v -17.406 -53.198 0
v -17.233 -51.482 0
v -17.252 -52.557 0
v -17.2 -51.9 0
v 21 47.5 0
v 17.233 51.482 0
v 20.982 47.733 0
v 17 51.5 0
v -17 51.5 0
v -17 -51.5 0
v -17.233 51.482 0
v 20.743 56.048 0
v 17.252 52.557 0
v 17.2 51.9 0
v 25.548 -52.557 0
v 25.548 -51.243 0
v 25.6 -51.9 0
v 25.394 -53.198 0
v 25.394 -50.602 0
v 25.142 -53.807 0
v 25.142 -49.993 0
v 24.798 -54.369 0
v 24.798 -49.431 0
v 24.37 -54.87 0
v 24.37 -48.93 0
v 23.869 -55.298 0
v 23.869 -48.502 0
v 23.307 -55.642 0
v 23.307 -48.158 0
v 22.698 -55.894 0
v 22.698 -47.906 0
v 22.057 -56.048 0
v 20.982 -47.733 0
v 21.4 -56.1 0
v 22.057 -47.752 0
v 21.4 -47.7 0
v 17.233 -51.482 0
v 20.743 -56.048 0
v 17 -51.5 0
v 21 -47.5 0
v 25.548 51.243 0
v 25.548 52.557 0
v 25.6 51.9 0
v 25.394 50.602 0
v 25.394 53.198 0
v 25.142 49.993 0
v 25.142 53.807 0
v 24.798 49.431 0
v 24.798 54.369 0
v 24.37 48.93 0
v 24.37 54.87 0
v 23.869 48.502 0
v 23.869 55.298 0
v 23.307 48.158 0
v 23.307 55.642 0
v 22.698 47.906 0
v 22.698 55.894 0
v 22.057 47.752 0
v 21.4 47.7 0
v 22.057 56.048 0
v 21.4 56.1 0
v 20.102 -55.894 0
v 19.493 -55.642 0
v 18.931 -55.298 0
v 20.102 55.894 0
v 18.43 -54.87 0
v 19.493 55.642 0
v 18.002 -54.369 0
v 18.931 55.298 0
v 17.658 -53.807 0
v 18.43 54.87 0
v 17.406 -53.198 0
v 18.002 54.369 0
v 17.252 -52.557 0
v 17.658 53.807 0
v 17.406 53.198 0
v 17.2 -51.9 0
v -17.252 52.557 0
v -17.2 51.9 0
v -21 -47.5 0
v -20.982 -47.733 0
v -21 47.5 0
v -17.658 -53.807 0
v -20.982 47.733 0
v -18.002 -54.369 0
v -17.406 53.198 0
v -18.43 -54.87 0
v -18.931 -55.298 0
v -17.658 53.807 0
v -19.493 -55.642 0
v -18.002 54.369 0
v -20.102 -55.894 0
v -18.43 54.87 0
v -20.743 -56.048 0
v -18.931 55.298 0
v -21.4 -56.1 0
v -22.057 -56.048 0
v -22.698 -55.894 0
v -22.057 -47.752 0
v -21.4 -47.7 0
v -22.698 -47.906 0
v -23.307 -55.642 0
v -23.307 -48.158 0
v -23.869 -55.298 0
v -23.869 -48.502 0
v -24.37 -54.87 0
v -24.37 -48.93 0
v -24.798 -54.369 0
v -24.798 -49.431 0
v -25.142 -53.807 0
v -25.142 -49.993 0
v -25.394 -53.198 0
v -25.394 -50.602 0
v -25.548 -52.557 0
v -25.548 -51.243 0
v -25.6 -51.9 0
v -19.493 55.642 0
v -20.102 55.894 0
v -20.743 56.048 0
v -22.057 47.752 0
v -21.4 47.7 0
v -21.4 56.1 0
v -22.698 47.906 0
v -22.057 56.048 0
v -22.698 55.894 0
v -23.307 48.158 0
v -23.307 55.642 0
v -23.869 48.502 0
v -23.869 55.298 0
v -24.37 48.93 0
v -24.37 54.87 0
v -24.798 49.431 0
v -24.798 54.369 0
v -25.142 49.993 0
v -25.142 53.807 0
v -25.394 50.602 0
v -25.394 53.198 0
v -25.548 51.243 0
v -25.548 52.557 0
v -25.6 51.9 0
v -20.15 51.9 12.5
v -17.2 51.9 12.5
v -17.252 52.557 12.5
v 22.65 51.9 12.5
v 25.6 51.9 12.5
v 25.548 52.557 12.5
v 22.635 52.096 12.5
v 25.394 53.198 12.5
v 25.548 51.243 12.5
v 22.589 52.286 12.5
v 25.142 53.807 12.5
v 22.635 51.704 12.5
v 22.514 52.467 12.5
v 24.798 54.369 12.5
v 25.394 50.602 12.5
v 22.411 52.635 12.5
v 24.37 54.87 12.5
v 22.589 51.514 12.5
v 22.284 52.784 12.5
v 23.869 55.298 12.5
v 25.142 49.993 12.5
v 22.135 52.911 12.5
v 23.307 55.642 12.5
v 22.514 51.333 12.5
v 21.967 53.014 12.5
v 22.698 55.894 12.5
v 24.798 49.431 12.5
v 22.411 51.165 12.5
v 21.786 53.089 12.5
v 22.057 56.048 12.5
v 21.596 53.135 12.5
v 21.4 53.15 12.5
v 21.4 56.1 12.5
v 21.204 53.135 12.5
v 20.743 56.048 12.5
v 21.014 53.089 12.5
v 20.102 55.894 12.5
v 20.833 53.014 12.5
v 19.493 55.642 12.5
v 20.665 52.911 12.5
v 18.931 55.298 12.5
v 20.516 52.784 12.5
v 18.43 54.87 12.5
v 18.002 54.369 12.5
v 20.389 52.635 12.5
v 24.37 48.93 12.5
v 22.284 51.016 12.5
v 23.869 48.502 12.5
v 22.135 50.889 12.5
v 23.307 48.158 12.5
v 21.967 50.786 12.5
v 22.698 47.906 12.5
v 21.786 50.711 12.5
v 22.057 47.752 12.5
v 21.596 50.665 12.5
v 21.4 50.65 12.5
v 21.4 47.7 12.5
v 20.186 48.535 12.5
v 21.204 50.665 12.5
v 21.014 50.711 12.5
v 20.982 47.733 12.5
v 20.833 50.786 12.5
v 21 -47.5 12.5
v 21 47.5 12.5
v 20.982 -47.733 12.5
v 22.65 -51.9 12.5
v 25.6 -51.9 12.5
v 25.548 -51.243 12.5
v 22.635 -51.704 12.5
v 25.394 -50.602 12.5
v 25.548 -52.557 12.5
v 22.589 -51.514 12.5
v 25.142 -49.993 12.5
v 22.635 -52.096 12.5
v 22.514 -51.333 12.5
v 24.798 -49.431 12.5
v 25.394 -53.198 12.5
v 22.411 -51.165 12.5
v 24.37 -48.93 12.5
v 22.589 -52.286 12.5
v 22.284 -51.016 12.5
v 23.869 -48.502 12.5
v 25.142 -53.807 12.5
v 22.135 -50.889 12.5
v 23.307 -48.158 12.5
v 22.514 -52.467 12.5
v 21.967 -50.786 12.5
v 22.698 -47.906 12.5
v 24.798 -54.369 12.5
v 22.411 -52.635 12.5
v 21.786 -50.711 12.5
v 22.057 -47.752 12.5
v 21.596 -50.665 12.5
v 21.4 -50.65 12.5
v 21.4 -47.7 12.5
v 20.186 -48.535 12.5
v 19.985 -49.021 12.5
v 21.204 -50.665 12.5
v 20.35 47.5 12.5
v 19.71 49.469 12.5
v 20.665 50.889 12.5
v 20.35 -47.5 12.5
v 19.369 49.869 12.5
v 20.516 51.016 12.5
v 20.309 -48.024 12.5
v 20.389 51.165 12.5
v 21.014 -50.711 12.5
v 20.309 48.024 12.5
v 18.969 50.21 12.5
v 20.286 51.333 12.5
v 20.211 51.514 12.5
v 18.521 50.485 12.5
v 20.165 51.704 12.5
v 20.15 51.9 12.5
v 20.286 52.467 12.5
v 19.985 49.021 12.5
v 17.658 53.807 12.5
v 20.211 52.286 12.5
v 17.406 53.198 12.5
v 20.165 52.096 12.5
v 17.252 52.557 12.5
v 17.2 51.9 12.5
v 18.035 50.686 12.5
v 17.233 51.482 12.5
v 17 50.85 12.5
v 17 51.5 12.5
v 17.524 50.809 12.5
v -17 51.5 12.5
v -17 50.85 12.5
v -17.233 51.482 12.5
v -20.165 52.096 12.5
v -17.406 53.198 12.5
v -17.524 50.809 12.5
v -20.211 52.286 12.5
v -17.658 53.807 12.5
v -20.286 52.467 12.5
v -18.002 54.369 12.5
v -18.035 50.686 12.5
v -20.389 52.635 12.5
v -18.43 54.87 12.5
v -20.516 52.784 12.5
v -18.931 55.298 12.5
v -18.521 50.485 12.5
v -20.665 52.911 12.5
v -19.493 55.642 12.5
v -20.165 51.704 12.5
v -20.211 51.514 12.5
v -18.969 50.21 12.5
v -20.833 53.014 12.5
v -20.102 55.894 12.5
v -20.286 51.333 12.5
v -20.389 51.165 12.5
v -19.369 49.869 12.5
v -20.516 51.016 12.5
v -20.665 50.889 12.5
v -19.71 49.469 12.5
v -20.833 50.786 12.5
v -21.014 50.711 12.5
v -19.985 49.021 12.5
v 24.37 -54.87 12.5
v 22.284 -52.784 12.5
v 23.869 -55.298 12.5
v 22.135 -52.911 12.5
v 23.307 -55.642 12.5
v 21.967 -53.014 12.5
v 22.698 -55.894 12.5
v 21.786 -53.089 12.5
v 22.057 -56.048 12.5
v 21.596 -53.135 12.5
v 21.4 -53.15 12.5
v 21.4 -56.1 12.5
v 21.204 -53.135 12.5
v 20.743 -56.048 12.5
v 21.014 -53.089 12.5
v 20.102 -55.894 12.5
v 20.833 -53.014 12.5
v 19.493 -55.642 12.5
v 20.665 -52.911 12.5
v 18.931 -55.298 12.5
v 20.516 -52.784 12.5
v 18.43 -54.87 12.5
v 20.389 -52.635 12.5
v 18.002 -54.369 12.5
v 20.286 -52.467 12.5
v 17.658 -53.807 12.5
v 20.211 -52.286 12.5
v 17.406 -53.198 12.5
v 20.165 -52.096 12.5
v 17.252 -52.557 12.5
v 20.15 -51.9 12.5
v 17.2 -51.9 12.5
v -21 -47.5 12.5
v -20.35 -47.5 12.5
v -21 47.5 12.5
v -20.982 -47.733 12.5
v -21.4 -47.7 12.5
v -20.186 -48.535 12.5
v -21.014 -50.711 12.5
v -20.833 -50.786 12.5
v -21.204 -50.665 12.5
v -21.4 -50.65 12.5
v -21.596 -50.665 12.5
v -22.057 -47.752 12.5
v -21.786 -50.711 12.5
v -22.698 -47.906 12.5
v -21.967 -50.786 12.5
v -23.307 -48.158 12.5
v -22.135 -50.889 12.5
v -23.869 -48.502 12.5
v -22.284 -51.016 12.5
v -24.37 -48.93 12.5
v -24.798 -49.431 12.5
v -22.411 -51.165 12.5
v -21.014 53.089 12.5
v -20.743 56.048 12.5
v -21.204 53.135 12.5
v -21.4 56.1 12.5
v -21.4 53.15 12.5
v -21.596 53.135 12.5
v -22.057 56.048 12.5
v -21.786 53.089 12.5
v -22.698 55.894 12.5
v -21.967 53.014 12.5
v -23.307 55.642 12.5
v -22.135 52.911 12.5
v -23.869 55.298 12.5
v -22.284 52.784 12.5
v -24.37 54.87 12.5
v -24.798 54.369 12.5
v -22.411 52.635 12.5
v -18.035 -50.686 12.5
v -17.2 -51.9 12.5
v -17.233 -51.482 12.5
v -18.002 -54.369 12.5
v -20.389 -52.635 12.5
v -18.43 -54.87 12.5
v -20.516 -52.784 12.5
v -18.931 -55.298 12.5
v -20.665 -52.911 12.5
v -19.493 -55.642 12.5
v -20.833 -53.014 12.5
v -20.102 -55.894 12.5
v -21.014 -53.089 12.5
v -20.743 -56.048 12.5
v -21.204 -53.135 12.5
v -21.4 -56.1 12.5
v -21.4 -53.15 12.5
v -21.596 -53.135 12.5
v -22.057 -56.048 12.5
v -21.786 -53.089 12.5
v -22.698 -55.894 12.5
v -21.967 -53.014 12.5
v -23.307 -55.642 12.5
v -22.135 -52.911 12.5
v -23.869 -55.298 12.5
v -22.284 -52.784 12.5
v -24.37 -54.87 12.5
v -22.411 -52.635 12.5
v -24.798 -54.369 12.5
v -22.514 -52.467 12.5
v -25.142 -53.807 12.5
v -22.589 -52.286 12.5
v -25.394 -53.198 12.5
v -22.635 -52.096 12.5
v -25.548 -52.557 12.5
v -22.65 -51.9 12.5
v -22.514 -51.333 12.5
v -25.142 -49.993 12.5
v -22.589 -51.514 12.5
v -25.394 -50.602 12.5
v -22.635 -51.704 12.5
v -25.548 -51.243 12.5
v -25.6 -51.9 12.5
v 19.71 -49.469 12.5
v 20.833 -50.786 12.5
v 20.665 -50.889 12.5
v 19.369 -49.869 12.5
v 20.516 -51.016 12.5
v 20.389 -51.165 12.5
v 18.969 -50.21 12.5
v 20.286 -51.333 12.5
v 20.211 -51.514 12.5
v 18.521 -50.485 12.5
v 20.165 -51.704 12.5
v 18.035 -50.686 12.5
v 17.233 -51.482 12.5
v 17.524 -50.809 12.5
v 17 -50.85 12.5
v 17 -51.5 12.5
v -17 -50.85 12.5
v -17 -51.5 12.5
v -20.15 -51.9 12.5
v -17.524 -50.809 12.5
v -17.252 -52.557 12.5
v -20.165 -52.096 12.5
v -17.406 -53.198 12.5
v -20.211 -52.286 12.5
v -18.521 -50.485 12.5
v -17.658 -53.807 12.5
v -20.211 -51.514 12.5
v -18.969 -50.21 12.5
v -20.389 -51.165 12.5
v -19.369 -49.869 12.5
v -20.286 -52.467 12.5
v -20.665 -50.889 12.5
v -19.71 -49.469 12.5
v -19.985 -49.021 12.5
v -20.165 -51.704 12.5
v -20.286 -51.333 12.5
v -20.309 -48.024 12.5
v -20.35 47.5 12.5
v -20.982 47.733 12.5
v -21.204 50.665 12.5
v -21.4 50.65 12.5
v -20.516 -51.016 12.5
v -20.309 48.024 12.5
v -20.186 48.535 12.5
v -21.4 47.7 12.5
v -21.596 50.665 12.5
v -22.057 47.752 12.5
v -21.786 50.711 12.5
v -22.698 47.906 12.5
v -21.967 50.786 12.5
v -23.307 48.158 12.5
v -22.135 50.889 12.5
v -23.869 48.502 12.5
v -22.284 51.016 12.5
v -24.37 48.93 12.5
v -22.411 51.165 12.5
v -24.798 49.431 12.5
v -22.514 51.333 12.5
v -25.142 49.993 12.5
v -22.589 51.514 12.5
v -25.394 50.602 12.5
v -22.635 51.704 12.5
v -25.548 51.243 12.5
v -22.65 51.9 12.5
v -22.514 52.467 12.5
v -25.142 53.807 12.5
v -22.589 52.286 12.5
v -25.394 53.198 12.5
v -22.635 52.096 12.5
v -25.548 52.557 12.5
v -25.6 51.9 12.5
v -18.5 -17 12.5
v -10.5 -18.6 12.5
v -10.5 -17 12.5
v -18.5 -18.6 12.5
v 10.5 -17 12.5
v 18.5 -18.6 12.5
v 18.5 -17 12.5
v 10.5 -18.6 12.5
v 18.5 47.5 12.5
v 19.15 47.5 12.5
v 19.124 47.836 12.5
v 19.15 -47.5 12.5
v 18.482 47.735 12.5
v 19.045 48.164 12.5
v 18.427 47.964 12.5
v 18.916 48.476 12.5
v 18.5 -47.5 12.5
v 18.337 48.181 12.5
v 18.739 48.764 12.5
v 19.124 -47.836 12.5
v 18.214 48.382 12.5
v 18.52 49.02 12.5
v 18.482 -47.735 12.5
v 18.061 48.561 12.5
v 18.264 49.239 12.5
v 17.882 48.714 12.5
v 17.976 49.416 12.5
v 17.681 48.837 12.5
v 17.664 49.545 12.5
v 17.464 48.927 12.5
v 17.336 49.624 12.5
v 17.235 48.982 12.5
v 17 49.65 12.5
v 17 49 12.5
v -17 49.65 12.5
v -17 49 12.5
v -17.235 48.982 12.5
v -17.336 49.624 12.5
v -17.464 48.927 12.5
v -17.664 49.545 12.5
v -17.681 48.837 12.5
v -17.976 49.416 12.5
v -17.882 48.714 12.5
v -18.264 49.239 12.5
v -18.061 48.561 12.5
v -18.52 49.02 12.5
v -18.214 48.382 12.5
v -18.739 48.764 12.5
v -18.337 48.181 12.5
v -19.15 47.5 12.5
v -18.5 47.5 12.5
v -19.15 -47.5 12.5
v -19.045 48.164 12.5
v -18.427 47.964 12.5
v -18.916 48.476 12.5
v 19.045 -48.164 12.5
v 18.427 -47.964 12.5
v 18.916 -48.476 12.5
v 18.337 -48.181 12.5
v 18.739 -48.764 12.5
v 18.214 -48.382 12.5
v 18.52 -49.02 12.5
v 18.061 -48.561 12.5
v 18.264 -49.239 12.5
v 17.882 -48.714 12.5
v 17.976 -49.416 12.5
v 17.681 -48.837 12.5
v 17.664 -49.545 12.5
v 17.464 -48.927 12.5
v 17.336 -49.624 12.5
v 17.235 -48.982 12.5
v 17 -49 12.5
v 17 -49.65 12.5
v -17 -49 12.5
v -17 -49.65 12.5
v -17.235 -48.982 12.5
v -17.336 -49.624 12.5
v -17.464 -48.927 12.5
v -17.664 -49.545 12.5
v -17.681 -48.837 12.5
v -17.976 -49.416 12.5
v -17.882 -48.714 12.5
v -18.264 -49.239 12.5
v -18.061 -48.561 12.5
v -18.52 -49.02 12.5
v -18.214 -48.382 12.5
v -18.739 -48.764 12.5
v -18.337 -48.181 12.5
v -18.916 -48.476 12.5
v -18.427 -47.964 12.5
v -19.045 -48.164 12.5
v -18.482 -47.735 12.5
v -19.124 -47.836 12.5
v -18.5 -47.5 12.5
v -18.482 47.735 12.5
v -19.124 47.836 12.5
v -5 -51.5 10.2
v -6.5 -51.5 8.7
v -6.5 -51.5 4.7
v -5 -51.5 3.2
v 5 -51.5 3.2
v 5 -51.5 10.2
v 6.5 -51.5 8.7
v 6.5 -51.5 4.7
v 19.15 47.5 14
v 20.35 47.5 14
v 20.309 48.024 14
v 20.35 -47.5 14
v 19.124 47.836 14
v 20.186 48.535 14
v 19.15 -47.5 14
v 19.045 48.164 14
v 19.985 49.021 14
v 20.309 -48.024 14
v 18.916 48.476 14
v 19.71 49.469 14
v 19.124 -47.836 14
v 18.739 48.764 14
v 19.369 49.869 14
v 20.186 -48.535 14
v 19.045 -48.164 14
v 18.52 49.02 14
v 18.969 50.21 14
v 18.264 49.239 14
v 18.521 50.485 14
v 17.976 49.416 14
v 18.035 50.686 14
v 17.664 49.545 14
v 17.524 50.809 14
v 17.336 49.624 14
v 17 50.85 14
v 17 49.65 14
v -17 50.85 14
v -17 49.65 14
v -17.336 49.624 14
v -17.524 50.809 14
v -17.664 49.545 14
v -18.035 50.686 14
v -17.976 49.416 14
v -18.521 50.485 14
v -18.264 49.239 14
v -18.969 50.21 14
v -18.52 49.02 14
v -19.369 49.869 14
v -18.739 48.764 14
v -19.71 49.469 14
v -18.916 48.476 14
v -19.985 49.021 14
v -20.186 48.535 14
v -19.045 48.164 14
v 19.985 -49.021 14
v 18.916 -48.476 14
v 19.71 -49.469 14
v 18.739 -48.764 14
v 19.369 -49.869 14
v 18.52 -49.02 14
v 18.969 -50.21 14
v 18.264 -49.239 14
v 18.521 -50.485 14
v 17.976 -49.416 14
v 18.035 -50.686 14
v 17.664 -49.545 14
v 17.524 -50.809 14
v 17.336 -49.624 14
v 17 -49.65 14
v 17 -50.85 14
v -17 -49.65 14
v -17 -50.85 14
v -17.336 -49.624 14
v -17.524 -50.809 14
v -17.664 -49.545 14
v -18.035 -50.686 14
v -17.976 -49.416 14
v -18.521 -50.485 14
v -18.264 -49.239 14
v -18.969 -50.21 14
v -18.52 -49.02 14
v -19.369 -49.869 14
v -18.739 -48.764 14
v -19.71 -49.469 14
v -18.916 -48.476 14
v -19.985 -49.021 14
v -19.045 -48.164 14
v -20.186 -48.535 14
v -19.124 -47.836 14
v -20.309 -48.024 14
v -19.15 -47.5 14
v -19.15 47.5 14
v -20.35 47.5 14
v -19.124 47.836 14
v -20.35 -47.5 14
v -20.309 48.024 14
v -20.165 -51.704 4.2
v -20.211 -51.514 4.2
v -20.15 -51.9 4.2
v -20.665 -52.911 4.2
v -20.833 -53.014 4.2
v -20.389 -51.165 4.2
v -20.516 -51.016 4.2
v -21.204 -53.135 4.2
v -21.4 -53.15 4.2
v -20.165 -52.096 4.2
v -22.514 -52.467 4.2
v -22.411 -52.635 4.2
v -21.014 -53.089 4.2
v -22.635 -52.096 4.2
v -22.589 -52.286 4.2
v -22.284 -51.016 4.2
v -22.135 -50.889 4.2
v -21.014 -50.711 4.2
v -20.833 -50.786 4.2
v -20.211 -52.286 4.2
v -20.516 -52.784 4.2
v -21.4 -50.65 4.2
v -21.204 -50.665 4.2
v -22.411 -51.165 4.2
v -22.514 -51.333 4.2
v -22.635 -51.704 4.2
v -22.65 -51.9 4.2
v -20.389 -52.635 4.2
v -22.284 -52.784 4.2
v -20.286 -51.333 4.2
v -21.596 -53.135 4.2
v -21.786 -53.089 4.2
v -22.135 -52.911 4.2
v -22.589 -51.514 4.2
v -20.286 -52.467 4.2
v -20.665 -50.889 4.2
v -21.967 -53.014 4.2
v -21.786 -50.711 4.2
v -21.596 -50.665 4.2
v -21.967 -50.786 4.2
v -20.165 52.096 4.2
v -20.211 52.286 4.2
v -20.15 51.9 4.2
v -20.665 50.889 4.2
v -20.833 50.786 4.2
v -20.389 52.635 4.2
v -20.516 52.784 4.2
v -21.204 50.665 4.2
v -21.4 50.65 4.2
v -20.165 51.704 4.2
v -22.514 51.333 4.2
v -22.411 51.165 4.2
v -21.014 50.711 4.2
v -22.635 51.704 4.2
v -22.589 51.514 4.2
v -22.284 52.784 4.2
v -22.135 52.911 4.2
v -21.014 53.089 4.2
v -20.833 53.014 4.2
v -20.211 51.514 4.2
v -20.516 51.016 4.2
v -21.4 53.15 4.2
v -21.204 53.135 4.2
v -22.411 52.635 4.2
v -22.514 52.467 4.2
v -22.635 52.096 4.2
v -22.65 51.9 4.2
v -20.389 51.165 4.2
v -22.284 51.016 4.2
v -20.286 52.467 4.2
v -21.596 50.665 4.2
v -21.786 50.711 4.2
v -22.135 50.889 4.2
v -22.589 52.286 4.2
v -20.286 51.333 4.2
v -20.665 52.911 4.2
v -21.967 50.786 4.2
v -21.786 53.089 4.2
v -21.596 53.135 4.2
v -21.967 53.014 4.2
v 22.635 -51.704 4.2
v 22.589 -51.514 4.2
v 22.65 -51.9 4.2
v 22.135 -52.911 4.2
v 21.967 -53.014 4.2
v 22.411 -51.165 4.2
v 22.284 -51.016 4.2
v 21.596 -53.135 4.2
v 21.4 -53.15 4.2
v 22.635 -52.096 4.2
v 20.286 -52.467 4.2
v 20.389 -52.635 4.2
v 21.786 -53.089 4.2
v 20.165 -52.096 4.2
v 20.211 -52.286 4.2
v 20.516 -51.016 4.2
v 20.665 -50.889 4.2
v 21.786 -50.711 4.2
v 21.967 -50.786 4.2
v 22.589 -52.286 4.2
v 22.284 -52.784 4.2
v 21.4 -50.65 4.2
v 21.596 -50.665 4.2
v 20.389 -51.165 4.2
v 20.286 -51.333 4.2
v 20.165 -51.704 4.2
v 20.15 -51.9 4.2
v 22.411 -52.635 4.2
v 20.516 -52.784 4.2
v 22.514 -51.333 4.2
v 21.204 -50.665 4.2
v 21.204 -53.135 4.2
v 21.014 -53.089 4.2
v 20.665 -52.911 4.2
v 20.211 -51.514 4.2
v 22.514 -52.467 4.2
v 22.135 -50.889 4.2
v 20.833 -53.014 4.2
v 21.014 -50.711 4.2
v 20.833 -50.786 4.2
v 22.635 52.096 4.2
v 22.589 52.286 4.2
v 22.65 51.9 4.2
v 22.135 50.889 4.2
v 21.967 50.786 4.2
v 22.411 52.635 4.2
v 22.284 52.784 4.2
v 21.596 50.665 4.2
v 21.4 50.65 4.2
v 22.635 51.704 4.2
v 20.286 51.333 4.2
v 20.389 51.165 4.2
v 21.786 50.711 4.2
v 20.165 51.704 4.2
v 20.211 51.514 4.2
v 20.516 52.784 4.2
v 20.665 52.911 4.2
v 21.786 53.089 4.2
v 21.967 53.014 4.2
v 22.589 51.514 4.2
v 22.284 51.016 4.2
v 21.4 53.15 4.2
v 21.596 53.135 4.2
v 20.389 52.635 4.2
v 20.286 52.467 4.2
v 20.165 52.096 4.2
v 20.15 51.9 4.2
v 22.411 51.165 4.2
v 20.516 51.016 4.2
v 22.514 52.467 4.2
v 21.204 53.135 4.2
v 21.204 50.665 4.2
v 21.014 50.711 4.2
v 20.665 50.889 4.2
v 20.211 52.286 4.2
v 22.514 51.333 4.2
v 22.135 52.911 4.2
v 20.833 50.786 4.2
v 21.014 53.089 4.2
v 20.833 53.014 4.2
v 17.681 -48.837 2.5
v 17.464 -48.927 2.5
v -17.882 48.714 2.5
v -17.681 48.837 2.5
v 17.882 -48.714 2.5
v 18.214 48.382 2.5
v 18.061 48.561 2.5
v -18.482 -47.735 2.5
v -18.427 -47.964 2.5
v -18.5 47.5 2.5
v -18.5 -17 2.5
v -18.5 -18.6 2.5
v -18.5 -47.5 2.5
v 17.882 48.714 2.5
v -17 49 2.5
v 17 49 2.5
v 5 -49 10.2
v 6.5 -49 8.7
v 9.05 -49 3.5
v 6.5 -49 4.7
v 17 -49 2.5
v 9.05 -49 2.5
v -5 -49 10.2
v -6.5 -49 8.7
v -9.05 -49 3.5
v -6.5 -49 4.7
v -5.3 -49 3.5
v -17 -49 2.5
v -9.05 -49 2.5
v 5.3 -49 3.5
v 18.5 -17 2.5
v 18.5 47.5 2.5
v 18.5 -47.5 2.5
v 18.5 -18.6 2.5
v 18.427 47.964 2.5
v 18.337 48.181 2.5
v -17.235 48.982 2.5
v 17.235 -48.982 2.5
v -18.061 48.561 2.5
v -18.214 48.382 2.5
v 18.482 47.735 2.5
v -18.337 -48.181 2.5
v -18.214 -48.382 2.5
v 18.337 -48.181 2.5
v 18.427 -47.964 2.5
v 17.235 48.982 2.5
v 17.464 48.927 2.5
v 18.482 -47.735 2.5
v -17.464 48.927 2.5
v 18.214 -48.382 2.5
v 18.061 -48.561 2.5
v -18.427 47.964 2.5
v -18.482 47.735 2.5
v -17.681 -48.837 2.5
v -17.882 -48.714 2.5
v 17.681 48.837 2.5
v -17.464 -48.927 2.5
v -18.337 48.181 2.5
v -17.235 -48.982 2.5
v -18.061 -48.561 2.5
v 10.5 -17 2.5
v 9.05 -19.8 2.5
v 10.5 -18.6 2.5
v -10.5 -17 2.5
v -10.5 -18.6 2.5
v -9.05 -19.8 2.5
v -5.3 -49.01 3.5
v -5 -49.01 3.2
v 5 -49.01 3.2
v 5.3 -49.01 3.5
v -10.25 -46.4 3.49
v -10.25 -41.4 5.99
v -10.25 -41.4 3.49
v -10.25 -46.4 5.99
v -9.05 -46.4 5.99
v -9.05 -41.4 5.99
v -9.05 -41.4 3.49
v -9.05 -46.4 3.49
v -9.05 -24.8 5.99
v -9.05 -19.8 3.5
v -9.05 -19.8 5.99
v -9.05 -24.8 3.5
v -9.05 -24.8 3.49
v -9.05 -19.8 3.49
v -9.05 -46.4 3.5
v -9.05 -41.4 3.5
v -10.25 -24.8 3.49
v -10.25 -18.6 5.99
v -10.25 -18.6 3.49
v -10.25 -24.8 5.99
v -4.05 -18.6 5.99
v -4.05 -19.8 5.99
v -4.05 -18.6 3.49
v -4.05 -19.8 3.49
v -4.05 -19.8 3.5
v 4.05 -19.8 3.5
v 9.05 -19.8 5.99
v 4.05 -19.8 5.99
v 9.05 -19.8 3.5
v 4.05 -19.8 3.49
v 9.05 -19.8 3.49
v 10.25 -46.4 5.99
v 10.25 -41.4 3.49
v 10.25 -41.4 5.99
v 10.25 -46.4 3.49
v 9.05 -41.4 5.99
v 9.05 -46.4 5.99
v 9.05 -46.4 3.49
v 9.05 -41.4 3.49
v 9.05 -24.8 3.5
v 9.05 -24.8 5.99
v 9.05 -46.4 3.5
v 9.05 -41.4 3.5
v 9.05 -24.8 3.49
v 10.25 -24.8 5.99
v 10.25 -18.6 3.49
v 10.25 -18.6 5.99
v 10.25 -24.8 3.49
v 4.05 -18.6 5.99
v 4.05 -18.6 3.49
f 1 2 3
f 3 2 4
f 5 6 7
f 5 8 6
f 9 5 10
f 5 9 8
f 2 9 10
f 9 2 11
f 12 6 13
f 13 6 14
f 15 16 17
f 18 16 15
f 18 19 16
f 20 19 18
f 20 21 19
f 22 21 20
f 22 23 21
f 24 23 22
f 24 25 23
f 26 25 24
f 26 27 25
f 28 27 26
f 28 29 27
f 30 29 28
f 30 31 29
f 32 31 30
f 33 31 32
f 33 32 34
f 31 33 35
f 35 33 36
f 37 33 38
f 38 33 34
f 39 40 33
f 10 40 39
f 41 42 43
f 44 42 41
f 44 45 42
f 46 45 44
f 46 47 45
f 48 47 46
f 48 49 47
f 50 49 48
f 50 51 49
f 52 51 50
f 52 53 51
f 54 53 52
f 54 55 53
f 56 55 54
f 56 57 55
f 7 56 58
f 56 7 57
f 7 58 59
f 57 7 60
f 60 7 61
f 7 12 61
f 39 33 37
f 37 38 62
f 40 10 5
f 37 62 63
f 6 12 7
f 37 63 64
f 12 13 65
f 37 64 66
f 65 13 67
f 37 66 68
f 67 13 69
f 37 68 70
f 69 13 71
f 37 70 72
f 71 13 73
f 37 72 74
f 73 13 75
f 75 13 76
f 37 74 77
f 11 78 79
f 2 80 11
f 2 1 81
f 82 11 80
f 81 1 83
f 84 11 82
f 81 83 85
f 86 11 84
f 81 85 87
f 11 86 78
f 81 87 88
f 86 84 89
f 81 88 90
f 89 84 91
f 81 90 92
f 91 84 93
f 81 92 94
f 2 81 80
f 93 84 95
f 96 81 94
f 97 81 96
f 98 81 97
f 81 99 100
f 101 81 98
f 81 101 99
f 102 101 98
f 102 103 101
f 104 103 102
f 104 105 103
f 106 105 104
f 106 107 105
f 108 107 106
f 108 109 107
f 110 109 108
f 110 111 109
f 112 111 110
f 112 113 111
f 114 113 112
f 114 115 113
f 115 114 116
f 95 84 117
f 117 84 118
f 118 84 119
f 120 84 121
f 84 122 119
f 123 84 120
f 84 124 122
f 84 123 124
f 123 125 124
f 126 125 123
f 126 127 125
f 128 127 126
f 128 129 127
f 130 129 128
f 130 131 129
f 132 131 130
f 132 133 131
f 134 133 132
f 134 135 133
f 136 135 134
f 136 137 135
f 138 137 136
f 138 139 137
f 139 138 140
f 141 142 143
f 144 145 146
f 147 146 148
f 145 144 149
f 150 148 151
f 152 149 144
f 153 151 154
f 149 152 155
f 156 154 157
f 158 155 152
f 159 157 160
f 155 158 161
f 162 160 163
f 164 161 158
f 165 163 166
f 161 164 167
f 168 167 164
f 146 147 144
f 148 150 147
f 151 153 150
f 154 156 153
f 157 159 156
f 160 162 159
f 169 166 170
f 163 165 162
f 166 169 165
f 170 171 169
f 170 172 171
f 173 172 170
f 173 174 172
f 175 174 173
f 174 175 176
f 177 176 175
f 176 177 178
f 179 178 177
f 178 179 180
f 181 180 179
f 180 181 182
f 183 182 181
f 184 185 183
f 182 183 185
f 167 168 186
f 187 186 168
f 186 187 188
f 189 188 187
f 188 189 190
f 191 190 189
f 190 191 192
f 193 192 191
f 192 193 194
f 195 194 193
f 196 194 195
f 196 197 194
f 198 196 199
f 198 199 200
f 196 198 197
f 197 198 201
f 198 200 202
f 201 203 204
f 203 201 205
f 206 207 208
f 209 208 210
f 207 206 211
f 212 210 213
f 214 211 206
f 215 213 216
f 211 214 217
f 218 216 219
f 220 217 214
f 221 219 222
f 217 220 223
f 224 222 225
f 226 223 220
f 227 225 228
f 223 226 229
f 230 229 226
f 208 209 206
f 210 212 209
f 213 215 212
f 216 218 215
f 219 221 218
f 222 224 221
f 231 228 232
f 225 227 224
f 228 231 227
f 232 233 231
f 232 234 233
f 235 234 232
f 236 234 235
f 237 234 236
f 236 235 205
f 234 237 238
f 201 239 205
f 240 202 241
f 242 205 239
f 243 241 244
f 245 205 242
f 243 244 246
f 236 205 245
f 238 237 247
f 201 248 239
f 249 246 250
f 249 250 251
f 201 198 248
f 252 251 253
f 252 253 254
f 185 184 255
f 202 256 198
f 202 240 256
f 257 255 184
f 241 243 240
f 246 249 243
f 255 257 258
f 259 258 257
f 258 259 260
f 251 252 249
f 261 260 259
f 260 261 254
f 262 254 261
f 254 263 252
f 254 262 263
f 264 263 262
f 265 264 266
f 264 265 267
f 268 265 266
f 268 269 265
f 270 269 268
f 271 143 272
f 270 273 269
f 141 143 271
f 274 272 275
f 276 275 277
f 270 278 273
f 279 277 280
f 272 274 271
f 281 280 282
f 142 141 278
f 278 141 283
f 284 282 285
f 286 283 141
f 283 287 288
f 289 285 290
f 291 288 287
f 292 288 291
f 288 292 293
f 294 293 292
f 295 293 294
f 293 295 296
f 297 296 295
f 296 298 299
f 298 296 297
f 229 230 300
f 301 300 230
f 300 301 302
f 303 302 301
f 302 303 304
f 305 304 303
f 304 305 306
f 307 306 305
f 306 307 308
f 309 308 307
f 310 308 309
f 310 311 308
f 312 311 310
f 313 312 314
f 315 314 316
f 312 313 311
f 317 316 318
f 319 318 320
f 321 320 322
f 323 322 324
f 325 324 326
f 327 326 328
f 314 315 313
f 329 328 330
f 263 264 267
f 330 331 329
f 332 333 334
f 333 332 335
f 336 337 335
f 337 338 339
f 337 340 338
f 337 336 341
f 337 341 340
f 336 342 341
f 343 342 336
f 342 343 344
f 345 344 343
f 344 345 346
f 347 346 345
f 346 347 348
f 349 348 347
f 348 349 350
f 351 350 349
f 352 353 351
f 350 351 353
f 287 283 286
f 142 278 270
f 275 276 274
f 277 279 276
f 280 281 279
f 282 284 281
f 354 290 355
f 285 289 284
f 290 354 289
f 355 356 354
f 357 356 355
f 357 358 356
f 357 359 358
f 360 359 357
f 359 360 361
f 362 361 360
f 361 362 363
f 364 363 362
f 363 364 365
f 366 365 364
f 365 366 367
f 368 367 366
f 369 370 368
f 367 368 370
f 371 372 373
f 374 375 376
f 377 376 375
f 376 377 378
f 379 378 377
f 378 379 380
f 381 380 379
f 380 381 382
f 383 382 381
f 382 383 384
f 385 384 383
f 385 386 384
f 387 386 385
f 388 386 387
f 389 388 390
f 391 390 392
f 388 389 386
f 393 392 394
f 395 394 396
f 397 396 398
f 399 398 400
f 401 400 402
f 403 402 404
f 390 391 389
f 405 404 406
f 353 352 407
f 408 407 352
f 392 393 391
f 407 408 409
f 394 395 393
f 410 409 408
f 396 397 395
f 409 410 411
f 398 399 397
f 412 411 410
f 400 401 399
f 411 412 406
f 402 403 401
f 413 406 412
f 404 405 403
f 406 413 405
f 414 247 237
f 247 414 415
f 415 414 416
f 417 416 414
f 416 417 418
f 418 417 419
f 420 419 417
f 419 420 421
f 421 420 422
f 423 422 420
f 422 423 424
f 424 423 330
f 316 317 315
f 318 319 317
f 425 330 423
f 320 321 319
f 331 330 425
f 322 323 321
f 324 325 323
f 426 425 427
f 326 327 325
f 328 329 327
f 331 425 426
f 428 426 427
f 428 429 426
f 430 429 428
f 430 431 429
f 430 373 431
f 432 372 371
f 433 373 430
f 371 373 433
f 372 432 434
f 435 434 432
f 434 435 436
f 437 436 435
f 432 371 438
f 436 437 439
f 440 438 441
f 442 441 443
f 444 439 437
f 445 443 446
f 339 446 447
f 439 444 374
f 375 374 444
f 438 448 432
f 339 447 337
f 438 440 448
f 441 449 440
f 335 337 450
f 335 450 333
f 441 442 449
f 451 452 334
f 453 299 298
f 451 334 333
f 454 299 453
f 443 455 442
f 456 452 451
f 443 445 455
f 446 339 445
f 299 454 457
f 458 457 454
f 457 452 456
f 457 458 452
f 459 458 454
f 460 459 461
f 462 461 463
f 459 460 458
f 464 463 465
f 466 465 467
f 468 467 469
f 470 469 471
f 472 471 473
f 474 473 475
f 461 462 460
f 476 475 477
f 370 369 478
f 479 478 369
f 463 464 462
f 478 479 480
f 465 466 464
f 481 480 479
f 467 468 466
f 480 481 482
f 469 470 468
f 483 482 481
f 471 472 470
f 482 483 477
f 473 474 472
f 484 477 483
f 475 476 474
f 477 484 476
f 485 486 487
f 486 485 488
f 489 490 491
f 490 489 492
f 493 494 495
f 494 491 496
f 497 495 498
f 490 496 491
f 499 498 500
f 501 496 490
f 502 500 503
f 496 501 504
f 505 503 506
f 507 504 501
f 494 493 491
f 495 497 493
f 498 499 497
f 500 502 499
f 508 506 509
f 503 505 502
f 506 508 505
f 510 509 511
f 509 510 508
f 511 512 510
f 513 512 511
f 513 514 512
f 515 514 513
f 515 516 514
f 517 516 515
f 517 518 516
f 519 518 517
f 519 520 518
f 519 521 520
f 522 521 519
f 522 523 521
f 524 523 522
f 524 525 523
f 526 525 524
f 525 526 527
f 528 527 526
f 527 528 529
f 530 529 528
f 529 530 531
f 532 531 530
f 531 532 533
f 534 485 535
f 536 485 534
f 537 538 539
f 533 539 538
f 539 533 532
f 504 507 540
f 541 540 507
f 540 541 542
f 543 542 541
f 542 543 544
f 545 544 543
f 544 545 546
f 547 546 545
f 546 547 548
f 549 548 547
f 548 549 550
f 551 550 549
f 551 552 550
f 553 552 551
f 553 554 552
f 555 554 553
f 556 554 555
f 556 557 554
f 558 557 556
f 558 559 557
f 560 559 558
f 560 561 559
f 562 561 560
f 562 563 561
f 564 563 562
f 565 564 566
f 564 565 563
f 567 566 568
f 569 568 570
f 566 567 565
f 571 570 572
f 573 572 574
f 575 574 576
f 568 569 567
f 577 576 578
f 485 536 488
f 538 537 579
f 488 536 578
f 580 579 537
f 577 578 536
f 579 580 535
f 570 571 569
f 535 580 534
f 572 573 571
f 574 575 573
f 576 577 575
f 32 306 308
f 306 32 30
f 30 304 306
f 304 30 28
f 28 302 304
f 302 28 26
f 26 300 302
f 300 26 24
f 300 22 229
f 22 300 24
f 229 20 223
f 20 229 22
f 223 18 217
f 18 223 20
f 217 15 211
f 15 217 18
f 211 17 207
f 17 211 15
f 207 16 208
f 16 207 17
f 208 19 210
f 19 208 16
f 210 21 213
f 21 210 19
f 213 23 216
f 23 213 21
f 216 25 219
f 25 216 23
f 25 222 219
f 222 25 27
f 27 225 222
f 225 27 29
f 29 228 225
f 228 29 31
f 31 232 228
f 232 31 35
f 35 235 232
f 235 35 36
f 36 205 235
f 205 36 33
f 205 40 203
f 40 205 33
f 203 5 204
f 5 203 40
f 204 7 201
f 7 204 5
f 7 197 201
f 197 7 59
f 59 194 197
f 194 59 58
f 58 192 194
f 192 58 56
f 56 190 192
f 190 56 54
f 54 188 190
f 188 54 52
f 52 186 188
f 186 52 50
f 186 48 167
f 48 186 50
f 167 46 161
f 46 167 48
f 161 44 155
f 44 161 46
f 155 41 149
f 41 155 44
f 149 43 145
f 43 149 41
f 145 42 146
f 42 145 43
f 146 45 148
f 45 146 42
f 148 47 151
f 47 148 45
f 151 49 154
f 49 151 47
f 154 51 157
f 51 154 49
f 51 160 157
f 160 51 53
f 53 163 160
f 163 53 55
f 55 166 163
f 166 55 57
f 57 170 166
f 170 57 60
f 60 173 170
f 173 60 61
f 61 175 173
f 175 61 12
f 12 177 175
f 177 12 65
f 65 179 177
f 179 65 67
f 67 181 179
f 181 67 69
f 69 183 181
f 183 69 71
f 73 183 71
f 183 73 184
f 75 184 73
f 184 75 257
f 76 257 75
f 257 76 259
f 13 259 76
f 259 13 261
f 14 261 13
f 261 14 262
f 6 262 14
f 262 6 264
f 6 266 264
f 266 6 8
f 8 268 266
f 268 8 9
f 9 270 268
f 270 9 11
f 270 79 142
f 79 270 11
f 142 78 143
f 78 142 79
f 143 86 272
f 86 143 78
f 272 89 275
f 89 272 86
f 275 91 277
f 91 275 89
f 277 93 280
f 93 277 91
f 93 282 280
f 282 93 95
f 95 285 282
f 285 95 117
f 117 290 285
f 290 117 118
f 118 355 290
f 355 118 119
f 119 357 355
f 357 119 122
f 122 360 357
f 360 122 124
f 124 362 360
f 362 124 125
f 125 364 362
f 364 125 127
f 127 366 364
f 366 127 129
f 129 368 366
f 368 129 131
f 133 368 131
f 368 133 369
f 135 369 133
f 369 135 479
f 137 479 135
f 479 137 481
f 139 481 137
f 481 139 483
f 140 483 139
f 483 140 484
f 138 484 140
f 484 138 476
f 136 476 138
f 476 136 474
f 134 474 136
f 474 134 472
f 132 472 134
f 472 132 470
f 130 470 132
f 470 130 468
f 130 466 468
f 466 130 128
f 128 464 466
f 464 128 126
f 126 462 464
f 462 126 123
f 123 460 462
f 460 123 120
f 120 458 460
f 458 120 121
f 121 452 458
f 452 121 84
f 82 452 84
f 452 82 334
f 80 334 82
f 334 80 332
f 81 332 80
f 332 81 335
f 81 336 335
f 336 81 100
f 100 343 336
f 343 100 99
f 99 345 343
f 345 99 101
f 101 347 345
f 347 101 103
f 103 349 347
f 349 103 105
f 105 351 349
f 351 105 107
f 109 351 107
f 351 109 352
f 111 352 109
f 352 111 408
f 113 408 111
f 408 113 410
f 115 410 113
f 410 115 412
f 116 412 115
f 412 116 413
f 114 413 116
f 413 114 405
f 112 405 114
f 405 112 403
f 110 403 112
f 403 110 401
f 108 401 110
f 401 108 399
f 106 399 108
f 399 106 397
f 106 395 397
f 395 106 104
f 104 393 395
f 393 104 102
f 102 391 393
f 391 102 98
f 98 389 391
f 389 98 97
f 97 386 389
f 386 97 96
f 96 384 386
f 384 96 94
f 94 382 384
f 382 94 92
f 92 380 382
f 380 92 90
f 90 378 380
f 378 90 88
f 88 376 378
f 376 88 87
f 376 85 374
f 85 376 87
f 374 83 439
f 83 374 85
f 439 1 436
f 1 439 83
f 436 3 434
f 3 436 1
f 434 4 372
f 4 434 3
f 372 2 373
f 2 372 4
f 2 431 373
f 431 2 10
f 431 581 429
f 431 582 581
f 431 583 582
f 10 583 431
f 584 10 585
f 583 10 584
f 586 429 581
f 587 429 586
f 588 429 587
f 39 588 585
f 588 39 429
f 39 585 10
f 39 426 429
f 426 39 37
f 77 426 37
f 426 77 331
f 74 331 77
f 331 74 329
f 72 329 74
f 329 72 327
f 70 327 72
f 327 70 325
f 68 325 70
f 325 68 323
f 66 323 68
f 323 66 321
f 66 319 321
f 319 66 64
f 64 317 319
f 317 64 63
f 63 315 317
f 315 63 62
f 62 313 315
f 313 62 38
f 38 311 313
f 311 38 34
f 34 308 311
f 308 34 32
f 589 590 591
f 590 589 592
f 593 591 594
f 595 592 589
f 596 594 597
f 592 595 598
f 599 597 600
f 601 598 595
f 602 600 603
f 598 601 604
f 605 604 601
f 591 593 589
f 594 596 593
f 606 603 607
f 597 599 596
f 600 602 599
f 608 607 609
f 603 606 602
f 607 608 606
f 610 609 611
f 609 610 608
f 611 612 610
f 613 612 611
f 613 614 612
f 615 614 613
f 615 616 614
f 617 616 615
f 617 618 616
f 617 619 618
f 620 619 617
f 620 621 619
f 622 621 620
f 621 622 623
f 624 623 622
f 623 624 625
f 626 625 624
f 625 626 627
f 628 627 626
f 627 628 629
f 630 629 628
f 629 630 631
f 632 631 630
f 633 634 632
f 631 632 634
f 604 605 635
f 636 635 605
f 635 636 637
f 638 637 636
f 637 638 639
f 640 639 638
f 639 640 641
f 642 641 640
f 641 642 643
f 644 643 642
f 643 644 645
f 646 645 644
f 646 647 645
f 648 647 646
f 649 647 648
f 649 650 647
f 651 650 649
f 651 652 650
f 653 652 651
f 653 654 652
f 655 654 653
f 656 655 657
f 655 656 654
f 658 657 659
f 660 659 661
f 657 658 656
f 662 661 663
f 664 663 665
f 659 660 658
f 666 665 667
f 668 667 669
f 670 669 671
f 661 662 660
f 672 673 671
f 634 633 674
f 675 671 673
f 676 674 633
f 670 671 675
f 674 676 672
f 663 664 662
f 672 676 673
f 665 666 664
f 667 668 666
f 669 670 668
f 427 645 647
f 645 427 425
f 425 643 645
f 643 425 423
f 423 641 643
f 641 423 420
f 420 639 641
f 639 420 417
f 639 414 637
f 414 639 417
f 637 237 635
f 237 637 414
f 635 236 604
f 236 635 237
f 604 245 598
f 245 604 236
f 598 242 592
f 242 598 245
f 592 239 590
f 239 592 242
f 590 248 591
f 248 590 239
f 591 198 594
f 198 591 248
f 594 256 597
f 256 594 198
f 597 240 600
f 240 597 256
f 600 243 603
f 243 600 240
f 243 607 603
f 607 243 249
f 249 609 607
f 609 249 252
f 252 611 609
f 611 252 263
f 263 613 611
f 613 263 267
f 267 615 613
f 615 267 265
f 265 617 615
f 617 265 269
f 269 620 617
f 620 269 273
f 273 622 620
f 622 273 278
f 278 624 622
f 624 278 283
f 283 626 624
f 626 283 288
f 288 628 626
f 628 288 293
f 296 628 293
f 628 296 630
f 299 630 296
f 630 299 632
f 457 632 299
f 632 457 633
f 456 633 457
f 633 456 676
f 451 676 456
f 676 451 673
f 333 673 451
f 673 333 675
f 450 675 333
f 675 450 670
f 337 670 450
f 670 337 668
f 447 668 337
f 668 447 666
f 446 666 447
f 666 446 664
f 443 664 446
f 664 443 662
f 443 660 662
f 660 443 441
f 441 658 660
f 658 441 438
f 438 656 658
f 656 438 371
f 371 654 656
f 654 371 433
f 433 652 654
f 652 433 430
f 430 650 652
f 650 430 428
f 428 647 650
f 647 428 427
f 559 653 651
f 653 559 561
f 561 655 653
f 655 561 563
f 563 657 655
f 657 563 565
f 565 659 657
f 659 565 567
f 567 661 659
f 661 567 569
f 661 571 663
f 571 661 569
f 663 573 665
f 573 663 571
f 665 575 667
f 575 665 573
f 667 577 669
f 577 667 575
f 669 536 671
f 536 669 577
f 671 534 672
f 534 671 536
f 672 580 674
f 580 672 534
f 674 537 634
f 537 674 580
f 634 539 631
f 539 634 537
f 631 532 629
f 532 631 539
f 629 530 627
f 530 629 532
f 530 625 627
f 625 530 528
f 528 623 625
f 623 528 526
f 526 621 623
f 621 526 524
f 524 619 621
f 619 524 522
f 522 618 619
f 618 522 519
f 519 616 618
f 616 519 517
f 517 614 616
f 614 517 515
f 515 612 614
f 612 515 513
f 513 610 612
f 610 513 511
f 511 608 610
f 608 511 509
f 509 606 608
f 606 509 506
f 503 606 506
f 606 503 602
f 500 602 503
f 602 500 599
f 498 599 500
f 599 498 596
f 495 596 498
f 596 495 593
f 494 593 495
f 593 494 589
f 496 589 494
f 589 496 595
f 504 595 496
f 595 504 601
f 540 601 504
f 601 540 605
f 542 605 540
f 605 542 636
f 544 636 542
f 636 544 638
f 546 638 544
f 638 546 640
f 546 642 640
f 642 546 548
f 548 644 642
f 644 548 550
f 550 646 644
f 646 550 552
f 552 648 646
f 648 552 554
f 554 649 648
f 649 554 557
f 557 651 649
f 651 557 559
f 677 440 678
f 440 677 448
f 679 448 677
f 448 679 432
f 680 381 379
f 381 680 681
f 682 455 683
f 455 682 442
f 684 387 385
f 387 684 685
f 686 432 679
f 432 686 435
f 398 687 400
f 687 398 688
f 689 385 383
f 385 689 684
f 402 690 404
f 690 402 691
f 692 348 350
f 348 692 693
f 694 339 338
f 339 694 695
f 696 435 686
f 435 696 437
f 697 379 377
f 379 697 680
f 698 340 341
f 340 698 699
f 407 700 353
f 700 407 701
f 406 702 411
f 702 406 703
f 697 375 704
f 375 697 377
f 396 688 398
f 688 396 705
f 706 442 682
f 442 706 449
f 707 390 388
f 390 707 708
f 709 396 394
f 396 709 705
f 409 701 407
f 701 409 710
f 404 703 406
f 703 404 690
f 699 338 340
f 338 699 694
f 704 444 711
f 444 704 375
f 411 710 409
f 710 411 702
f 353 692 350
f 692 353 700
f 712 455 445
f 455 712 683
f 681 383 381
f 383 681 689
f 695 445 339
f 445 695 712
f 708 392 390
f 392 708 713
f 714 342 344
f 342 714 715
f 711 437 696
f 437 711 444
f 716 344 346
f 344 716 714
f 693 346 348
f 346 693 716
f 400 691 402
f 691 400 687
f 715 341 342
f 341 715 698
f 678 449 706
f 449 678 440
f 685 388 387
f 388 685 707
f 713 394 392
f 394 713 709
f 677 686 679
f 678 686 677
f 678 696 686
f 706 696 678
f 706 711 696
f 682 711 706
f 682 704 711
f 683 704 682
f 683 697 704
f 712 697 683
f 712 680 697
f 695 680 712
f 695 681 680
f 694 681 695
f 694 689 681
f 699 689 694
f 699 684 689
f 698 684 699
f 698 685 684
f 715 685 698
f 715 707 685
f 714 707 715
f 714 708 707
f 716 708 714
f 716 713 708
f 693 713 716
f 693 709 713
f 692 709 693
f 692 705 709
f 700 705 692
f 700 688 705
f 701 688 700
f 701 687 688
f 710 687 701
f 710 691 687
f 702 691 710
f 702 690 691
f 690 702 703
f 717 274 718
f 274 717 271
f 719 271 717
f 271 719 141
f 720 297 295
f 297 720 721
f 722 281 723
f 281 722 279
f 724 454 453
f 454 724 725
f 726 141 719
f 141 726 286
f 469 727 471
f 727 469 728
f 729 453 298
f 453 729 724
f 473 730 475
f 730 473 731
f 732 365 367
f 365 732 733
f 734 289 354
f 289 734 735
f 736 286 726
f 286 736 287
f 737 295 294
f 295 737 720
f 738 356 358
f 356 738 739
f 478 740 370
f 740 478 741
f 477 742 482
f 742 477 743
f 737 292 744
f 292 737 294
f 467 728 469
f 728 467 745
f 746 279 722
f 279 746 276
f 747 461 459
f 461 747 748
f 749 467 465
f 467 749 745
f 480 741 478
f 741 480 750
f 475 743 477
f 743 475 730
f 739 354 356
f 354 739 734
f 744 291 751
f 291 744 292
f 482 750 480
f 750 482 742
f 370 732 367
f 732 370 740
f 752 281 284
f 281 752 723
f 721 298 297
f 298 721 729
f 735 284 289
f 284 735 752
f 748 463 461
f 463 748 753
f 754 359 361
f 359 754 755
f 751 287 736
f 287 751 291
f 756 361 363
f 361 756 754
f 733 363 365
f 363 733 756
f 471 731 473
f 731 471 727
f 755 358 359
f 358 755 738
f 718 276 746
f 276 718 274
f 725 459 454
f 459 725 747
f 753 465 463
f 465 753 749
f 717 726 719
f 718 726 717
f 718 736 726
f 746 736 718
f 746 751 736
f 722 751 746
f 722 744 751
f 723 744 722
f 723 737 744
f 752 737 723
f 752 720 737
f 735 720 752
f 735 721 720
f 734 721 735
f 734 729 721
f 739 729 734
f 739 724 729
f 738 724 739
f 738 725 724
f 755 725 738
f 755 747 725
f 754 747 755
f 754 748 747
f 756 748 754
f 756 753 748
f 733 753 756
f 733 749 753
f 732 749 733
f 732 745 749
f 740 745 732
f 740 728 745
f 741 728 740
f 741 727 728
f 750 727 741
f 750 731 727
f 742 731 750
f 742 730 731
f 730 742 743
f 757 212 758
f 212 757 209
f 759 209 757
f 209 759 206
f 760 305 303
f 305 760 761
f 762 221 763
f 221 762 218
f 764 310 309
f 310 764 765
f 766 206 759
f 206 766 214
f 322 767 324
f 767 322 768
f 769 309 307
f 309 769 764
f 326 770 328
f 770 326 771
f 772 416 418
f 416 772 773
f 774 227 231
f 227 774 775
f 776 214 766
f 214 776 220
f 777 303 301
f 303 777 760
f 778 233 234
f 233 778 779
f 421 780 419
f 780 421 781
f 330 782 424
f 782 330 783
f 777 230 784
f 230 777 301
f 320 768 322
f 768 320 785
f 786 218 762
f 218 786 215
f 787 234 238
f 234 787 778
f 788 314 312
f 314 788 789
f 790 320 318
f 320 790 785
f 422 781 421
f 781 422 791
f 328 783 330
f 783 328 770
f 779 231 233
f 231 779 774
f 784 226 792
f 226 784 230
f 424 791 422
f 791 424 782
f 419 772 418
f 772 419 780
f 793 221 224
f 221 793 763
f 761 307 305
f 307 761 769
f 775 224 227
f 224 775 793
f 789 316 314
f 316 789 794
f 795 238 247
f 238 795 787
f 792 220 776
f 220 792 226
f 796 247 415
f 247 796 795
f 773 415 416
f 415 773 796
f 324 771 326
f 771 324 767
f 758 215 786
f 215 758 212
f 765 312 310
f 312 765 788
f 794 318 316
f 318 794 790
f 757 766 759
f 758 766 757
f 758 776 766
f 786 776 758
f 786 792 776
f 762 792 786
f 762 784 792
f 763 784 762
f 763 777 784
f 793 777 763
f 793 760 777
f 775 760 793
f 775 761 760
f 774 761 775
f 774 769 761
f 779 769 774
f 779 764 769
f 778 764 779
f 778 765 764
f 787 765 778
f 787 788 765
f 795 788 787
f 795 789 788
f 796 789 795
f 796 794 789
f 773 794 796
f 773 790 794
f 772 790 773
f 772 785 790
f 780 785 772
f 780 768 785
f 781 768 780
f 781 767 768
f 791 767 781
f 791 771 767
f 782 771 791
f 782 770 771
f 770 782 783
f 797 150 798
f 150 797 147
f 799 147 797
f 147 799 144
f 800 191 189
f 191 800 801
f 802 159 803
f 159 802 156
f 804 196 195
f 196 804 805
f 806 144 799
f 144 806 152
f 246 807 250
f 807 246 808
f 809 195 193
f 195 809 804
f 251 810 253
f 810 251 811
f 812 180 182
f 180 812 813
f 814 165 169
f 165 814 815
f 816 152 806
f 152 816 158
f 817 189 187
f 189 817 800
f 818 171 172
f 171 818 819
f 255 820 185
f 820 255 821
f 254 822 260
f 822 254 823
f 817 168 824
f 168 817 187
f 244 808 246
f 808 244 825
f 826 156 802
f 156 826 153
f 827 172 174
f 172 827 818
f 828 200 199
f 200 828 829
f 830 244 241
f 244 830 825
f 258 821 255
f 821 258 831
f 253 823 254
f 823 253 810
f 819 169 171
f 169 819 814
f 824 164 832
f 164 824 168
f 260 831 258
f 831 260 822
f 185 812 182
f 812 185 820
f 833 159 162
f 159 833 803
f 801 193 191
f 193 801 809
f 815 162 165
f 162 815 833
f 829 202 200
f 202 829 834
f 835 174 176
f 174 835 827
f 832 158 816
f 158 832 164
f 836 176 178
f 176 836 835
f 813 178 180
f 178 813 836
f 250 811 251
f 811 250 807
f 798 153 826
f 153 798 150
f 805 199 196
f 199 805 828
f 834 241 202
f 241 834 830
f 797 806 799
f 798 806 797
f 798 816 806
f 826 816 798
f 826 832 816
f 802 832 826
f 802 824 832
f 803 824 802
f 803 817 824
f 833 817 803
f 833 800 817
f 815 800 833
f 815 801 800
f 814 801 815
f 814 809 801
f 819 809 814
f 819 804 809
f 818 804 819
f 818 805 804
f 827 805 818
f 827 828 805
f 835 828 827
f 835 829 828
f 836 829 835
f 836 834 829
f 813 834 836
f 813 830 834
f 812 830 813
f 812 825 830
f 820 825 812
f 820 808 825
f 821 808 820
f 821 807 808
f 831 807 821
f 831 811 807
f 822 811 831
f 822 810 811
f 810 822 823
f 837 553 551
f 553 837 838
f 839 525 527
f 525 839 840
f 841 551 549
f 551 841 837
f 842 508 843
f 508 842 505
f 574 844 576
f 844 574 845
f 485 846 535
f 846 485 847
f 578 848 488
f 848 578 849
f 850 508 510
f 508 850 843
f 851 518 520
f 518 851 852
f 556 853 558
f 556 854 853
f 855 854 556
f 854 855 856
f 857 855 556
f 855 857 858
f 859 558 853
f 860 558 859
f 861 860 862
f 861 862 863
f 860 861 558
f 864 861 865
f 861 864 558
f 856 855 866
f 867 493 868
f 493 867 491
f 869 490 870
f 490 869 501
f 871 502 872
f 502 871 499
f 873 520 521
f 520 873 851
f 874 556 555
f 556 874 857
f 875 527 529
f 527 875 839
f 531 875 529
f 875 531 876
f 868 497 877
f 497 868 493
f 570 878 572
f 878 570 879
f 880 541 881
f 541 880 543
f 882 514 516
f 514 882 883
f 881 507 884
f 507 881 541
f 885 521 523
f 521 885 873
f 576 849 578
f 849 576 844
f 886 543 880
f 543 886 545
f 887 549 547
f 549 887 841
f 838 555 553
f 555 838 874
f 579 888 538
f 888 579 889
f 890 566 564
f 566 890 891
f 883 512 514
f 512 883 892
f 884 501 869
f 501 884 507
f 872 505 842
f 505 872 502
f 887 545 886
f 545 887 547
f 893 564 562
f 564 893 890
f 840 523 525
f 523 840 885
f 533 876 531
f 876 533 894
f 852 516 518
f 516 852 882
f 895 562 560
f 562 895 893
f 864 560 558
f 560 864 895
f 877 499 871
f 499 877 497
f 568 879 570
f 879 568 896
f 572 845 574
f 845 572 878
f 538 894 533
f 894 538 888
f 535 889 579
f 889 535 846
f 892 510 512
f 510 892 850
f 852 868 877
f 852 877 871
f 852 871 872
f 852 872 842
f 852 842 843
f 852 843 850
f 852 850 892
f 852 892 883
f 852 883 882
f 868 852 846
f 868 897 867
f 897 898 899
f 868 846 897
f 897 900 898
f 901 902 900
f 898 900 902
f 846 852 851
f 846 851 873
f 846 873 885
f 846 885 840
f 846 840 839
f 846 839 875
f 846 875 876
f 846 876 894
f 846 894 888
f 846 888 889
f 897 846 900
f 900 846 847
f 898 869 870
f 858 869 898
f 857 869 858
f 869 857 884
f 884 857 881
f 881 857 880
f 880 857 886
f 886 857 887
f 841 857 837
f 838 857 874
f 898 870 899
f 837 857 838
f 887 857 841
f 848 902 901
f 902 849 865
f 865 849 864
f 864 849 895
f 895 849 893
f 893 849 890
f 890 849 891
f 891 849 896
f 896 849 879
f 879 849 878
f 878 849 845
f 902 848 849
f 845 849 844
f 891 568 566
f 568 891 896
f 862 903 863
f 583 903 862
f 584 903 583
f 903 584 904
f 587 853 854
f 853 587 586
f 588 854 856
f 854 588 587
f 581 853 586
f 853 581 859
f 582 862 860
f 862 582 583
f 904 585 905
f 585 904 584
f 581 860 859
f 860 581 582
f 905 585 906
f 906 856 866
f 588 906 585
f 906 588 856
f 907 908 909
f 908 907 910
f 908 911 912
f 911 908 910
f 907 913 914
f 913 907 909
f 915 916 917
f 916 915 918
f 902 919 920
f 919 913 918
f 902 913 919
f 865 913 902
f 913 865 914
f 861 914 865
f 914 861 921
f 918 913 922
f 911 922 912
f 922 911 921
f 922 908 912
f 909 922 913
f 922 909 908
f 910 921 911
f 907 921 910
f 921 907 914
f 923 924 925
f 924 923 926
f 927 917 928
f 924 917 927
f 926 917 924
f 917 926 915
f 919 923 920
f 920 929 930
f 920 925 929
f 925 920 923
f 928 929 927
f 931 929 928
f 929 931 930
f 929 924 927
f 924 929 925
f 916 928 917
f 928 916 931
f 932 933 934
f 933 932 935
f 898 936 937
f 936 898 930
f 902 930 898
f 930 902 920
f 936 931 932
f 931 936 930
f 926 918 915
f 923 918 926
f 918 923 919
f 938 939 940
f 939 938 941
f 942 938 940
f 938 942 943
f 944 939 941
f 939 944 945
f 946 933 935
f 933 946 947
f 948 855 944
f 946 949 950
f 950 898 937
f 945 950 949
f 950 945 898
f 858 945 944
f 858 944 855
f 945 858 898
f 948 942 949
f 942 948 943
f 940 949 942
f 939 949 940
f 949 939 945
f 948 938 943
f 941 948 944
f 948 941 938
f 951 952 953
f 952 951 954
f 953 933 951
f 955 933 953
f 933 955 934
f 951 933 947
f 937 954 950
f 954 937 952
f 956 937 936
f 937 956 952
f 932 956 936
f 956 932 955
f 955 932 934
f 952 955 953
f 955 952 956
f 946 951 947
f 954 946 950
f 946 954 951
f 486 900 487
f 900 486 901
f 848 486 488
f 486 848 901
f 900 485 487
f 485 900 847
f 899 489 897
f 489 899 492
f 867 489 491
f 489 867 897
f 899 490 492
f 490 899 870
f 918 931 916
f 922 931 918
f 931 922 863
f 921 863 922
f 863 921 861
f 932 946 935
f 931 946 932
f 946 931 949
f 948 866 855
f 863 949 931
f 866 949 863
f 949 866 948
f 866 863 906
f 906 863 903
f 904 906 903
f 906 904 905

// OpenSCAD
include <../lib/hc33-lipo-case-lib.scad>;
$fn = 40;
base();
